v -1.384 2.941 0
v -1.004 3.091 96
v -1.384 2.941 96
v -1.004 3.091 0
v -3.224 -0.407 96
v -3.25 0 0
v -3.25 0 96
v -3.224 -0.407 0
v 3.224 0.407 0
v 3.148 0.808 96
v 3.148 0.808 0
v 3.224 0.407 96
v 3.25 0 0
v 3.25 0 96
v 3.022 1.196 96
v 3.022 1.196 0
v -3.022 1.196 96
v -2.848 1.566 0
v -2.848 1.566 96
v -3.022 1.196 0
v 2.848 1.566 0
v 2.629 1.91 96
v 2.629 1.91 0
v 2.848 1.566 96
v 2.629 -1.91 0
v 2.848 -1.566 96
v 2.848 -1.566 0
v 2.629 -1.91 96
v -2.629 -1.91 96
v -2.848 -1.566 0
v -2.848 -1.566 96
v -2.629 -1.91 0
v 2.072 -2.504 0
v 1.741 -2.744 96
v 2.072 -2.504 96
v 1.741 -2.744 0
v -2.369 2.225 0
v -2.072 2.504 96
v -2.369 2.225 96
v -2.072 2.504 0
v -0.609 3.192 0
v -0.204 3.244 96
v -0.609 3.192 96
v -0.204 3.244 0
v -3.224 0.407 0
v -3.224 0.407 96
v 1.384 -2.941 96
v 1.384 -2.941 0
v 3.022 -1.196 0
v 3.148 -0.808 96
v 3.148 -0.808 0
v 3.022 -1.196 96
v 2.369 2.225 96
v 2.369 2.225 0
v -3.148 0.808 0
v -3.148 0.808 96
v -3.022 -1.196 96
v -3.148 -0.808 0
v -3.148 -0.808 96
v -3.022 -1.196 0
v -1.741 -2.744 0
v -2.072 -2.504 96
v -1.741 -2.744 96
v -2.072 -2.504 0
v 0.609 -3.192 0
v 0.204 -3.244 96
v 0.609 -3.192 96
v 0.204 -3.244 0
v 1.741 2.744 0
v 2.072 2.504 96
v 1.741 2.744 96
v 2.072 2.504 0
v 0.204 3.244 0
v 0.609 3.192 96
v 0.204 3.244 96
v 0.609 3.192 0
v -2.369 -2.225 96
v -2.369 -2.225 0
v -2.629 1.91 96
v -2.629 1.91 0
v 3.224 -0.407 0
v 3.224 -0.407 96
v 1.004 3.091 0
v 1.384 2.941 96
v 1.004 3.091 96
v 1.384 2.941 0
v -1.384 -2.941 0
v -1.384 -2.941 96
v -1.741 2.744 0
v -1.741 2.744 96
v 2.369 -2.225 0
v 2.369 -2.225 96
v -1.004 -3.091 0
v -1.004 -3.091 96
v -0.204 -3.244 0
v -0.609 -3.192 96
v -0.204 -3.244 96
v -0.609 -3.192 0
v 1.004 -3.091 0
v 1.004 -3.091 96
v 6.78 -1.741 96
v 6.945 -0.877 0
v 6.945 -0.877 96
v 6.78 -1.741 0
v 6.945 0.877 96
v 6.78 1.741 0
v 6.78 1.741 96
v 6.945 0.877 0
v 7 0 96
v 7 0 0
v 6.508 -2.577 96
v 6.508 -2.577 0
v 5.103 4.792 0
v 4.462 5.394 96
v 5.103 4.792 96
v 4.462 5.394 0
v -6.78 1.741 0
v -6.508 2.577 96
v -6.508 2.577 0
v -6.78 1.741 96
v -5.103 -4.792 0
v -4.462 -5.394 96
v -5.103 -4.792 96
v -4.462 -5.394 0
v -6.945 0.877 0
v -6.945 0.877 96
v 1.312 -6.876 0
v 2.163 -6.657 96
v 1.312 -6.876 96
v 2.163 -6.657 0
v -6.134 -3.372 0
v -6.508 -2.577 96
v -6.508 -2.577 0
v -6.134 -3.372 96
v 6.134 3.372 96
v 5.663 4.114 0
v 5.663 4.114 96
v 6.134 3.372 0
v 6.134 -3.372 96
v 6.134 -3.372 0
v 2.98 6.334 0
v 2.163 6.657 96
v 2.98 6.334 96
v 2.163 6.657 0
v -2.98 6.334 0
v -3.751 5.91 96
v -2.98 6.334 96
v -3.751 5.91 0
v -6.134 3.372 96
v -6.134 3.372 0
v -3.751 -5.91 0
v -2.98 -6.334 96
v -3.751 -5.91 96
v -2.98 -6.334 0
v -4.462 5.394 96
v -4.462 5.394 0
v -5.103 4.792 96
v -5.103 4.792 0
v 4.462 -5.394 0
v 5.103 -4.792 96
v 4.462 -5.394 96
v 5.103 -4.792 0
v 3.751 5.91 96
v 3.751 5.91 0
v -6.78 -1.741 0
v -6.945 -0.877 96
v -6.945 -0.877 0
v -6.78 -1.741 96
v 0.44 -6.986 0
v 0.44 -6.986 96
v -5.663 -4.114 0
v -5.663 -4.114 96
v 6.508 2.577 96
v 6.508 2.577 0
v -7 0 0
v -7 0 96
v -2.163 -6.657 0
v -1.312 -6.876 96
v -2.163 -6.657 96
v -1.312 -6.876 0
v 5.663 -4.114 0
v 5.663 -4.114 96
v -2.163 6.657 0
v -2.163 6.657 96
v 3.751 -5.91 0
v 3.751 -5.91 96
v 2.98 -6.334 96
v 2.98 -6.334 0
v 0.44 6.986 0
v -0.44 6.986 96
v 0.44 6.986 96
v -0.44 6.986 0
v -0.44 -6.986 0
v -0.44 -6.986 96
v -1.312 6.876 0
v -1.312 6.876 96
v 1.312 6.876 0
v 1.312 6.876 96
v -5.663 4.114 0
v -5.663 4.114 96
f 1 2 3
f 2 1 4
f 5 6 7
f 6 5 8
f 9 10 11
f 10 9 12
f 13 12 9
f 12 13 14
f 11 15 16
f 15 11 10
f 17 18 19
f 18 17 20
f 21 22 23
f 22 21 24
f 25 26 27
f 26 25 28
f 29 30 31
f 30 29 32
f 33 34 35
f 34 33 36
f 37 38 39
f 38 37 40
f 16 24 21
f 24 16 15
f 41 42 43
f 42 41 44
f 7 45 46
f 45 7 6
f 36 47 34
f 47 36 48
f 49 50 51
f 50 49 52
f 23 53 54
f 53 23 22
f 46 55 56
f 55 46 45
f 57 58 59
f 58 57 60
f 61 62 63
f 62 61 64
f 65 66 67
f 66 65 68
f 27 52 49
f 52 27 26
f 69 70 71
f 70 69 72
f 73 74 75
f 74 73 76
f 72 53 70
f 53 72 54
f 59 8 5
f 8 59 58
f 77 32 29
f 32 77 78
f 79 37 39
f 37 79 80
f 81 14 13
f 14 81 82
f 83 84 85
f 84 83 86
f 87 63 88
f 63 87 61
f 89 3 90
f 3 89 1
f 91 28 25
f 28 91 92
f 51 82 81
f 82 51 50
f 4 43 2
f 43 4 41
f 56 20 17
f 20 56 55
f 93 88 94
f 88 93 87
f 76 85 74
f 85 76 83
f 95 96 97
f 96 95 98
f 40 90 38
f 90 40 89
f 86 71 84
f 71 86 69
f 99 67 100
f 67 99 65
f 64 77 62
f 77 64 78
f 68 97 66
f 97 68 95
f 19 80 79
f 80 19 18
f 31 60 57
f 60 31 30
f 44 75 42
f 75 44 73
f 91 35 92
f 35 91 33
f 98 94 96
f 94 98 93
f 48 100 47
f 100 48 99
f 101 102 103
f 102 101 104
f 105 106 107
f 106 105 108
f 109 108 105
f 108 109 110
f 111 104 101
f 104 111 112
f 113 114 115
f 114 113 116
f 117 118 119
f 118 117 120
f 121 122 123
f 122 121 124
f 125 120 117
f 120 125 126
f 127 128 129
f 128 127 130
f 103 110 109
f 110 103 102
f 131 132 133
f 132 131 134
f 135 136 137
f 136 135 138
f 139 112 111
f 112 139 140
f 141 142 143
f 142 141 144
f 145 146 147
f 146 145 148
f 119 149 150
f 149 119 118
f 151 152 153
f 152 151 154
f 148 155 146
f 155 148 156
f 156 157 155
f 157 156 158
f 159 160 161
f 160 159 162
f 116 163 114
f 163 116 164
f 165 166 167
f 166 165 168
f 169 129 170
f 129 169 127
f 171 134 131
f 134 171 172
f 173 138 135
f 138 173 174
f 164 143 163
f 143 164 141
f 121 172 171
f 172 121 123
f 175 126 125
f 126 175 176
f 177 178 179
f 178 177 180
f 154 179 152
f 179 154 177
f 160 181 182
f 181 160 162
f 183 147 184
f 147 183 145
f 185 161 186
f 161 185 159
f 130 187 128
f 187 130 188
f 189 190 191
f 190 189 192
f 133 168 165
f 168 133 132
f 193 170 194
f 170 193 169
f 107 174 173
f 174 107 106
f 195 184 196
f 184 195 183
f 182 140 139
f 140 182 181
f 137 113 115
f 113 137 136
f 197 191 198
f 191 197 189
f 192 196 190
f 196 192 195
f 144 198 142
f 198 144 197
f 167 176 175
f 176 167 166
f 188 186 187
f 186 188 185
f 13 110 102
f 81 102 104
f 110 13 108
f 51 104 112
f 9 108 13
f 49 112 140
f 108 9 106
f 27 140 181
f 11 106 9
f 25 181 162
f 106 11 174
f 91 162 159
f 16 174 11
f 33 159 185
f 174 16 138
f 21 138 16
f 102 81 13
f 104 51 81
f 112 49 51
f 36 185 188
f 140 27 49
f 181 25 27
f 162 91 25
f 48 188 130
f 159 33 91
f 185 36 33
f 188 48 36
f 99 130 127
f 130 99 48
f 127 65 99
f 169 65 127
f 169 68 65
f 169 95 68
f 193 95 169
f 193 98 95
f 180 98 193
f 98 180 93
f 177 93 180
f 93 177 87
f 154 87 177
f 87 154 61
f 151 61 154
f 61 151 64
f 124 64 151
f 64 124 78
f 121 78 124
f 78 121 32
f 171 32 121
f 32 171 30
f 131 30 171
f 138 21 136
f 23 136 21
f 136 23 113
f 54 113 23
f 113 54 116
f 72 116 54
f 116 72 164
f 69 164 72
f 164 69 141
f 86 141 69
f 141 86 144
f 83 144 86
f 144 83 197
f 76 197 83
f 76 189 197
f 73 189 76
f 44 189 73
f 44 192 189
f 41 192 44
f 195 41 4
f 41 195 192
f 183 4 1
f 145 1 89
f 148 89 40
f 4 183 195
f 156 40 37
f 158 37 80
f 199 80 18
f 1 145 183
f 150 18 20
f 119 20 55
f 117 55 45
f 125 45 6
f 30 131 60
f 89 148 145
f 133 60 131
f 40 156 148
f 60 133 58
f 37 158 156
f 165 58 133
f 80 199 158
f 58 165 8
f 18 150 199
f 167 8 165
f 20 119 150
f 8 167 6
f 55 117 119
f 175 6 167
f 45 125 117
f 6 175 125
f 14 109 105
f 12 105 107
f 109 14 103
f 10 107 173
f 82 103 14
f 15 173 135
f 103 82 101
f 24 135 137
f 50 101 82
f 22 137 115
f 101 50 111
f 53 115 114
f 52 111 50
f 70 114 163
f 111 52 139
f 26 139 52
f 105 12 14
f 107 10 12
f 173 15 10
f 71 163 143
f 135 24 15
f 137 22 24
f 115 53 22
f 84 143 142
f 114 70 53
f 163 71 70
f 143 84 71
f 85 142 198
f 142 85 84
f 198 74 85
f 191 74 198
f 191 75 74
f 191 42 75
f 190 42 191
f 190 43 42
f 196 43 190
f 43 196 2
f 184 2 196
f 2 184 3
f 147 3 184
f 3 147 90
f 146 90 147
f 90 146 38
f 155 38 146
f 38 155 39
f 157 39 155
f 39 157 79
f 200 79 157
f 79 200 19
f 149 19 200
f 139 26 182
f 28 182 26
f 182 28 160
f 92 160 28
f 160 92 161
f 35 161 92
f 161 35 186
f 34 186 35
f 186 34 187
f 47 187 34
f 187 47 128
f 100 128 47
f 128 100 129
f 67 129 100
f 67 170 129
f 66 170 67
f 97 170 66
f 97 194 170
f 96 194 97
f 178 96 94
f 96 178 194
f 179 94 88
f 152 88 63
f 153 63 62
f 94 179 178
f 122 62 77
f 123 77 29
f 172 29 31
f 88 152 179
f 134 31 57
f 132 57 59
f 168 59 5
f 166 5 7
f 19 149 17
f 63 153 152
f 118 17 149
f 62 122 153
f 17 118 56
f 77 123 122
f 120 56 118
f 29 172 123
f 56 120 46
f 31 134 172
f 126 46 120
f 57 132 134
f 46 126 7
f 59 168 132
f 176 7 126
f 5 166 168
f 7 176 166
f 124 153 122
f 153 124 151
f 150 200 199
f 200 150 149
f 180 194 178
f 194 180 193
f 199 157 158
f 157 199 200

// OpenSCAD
$fn = 50;


difference() {
	union() {
		cylinder(h = 96, r = 7.0000000000);
	}
	union() {
		translate(v = [0.0000000000, 0.0000000000, -100.0000000000]) {
			cylinder(h = 200, r = 3.2500000000);
		}
		translate(v = [0.0000000000, 0.0000000000, -100.0000000000]) {
			cylinder(h = 200, r = 3.2500000000);
		}
		translate(v = [0.0000000000, 0.0000000000, -100.0000000000]) {
			cylinder(h = 200, r = 3.2500000000);
		}
		translate(v = [0.0000000000, 0.0000000000, -100.0000000000]) {
			cylinder(h = 200, r = 3.2500000000);
		}
	}
}
